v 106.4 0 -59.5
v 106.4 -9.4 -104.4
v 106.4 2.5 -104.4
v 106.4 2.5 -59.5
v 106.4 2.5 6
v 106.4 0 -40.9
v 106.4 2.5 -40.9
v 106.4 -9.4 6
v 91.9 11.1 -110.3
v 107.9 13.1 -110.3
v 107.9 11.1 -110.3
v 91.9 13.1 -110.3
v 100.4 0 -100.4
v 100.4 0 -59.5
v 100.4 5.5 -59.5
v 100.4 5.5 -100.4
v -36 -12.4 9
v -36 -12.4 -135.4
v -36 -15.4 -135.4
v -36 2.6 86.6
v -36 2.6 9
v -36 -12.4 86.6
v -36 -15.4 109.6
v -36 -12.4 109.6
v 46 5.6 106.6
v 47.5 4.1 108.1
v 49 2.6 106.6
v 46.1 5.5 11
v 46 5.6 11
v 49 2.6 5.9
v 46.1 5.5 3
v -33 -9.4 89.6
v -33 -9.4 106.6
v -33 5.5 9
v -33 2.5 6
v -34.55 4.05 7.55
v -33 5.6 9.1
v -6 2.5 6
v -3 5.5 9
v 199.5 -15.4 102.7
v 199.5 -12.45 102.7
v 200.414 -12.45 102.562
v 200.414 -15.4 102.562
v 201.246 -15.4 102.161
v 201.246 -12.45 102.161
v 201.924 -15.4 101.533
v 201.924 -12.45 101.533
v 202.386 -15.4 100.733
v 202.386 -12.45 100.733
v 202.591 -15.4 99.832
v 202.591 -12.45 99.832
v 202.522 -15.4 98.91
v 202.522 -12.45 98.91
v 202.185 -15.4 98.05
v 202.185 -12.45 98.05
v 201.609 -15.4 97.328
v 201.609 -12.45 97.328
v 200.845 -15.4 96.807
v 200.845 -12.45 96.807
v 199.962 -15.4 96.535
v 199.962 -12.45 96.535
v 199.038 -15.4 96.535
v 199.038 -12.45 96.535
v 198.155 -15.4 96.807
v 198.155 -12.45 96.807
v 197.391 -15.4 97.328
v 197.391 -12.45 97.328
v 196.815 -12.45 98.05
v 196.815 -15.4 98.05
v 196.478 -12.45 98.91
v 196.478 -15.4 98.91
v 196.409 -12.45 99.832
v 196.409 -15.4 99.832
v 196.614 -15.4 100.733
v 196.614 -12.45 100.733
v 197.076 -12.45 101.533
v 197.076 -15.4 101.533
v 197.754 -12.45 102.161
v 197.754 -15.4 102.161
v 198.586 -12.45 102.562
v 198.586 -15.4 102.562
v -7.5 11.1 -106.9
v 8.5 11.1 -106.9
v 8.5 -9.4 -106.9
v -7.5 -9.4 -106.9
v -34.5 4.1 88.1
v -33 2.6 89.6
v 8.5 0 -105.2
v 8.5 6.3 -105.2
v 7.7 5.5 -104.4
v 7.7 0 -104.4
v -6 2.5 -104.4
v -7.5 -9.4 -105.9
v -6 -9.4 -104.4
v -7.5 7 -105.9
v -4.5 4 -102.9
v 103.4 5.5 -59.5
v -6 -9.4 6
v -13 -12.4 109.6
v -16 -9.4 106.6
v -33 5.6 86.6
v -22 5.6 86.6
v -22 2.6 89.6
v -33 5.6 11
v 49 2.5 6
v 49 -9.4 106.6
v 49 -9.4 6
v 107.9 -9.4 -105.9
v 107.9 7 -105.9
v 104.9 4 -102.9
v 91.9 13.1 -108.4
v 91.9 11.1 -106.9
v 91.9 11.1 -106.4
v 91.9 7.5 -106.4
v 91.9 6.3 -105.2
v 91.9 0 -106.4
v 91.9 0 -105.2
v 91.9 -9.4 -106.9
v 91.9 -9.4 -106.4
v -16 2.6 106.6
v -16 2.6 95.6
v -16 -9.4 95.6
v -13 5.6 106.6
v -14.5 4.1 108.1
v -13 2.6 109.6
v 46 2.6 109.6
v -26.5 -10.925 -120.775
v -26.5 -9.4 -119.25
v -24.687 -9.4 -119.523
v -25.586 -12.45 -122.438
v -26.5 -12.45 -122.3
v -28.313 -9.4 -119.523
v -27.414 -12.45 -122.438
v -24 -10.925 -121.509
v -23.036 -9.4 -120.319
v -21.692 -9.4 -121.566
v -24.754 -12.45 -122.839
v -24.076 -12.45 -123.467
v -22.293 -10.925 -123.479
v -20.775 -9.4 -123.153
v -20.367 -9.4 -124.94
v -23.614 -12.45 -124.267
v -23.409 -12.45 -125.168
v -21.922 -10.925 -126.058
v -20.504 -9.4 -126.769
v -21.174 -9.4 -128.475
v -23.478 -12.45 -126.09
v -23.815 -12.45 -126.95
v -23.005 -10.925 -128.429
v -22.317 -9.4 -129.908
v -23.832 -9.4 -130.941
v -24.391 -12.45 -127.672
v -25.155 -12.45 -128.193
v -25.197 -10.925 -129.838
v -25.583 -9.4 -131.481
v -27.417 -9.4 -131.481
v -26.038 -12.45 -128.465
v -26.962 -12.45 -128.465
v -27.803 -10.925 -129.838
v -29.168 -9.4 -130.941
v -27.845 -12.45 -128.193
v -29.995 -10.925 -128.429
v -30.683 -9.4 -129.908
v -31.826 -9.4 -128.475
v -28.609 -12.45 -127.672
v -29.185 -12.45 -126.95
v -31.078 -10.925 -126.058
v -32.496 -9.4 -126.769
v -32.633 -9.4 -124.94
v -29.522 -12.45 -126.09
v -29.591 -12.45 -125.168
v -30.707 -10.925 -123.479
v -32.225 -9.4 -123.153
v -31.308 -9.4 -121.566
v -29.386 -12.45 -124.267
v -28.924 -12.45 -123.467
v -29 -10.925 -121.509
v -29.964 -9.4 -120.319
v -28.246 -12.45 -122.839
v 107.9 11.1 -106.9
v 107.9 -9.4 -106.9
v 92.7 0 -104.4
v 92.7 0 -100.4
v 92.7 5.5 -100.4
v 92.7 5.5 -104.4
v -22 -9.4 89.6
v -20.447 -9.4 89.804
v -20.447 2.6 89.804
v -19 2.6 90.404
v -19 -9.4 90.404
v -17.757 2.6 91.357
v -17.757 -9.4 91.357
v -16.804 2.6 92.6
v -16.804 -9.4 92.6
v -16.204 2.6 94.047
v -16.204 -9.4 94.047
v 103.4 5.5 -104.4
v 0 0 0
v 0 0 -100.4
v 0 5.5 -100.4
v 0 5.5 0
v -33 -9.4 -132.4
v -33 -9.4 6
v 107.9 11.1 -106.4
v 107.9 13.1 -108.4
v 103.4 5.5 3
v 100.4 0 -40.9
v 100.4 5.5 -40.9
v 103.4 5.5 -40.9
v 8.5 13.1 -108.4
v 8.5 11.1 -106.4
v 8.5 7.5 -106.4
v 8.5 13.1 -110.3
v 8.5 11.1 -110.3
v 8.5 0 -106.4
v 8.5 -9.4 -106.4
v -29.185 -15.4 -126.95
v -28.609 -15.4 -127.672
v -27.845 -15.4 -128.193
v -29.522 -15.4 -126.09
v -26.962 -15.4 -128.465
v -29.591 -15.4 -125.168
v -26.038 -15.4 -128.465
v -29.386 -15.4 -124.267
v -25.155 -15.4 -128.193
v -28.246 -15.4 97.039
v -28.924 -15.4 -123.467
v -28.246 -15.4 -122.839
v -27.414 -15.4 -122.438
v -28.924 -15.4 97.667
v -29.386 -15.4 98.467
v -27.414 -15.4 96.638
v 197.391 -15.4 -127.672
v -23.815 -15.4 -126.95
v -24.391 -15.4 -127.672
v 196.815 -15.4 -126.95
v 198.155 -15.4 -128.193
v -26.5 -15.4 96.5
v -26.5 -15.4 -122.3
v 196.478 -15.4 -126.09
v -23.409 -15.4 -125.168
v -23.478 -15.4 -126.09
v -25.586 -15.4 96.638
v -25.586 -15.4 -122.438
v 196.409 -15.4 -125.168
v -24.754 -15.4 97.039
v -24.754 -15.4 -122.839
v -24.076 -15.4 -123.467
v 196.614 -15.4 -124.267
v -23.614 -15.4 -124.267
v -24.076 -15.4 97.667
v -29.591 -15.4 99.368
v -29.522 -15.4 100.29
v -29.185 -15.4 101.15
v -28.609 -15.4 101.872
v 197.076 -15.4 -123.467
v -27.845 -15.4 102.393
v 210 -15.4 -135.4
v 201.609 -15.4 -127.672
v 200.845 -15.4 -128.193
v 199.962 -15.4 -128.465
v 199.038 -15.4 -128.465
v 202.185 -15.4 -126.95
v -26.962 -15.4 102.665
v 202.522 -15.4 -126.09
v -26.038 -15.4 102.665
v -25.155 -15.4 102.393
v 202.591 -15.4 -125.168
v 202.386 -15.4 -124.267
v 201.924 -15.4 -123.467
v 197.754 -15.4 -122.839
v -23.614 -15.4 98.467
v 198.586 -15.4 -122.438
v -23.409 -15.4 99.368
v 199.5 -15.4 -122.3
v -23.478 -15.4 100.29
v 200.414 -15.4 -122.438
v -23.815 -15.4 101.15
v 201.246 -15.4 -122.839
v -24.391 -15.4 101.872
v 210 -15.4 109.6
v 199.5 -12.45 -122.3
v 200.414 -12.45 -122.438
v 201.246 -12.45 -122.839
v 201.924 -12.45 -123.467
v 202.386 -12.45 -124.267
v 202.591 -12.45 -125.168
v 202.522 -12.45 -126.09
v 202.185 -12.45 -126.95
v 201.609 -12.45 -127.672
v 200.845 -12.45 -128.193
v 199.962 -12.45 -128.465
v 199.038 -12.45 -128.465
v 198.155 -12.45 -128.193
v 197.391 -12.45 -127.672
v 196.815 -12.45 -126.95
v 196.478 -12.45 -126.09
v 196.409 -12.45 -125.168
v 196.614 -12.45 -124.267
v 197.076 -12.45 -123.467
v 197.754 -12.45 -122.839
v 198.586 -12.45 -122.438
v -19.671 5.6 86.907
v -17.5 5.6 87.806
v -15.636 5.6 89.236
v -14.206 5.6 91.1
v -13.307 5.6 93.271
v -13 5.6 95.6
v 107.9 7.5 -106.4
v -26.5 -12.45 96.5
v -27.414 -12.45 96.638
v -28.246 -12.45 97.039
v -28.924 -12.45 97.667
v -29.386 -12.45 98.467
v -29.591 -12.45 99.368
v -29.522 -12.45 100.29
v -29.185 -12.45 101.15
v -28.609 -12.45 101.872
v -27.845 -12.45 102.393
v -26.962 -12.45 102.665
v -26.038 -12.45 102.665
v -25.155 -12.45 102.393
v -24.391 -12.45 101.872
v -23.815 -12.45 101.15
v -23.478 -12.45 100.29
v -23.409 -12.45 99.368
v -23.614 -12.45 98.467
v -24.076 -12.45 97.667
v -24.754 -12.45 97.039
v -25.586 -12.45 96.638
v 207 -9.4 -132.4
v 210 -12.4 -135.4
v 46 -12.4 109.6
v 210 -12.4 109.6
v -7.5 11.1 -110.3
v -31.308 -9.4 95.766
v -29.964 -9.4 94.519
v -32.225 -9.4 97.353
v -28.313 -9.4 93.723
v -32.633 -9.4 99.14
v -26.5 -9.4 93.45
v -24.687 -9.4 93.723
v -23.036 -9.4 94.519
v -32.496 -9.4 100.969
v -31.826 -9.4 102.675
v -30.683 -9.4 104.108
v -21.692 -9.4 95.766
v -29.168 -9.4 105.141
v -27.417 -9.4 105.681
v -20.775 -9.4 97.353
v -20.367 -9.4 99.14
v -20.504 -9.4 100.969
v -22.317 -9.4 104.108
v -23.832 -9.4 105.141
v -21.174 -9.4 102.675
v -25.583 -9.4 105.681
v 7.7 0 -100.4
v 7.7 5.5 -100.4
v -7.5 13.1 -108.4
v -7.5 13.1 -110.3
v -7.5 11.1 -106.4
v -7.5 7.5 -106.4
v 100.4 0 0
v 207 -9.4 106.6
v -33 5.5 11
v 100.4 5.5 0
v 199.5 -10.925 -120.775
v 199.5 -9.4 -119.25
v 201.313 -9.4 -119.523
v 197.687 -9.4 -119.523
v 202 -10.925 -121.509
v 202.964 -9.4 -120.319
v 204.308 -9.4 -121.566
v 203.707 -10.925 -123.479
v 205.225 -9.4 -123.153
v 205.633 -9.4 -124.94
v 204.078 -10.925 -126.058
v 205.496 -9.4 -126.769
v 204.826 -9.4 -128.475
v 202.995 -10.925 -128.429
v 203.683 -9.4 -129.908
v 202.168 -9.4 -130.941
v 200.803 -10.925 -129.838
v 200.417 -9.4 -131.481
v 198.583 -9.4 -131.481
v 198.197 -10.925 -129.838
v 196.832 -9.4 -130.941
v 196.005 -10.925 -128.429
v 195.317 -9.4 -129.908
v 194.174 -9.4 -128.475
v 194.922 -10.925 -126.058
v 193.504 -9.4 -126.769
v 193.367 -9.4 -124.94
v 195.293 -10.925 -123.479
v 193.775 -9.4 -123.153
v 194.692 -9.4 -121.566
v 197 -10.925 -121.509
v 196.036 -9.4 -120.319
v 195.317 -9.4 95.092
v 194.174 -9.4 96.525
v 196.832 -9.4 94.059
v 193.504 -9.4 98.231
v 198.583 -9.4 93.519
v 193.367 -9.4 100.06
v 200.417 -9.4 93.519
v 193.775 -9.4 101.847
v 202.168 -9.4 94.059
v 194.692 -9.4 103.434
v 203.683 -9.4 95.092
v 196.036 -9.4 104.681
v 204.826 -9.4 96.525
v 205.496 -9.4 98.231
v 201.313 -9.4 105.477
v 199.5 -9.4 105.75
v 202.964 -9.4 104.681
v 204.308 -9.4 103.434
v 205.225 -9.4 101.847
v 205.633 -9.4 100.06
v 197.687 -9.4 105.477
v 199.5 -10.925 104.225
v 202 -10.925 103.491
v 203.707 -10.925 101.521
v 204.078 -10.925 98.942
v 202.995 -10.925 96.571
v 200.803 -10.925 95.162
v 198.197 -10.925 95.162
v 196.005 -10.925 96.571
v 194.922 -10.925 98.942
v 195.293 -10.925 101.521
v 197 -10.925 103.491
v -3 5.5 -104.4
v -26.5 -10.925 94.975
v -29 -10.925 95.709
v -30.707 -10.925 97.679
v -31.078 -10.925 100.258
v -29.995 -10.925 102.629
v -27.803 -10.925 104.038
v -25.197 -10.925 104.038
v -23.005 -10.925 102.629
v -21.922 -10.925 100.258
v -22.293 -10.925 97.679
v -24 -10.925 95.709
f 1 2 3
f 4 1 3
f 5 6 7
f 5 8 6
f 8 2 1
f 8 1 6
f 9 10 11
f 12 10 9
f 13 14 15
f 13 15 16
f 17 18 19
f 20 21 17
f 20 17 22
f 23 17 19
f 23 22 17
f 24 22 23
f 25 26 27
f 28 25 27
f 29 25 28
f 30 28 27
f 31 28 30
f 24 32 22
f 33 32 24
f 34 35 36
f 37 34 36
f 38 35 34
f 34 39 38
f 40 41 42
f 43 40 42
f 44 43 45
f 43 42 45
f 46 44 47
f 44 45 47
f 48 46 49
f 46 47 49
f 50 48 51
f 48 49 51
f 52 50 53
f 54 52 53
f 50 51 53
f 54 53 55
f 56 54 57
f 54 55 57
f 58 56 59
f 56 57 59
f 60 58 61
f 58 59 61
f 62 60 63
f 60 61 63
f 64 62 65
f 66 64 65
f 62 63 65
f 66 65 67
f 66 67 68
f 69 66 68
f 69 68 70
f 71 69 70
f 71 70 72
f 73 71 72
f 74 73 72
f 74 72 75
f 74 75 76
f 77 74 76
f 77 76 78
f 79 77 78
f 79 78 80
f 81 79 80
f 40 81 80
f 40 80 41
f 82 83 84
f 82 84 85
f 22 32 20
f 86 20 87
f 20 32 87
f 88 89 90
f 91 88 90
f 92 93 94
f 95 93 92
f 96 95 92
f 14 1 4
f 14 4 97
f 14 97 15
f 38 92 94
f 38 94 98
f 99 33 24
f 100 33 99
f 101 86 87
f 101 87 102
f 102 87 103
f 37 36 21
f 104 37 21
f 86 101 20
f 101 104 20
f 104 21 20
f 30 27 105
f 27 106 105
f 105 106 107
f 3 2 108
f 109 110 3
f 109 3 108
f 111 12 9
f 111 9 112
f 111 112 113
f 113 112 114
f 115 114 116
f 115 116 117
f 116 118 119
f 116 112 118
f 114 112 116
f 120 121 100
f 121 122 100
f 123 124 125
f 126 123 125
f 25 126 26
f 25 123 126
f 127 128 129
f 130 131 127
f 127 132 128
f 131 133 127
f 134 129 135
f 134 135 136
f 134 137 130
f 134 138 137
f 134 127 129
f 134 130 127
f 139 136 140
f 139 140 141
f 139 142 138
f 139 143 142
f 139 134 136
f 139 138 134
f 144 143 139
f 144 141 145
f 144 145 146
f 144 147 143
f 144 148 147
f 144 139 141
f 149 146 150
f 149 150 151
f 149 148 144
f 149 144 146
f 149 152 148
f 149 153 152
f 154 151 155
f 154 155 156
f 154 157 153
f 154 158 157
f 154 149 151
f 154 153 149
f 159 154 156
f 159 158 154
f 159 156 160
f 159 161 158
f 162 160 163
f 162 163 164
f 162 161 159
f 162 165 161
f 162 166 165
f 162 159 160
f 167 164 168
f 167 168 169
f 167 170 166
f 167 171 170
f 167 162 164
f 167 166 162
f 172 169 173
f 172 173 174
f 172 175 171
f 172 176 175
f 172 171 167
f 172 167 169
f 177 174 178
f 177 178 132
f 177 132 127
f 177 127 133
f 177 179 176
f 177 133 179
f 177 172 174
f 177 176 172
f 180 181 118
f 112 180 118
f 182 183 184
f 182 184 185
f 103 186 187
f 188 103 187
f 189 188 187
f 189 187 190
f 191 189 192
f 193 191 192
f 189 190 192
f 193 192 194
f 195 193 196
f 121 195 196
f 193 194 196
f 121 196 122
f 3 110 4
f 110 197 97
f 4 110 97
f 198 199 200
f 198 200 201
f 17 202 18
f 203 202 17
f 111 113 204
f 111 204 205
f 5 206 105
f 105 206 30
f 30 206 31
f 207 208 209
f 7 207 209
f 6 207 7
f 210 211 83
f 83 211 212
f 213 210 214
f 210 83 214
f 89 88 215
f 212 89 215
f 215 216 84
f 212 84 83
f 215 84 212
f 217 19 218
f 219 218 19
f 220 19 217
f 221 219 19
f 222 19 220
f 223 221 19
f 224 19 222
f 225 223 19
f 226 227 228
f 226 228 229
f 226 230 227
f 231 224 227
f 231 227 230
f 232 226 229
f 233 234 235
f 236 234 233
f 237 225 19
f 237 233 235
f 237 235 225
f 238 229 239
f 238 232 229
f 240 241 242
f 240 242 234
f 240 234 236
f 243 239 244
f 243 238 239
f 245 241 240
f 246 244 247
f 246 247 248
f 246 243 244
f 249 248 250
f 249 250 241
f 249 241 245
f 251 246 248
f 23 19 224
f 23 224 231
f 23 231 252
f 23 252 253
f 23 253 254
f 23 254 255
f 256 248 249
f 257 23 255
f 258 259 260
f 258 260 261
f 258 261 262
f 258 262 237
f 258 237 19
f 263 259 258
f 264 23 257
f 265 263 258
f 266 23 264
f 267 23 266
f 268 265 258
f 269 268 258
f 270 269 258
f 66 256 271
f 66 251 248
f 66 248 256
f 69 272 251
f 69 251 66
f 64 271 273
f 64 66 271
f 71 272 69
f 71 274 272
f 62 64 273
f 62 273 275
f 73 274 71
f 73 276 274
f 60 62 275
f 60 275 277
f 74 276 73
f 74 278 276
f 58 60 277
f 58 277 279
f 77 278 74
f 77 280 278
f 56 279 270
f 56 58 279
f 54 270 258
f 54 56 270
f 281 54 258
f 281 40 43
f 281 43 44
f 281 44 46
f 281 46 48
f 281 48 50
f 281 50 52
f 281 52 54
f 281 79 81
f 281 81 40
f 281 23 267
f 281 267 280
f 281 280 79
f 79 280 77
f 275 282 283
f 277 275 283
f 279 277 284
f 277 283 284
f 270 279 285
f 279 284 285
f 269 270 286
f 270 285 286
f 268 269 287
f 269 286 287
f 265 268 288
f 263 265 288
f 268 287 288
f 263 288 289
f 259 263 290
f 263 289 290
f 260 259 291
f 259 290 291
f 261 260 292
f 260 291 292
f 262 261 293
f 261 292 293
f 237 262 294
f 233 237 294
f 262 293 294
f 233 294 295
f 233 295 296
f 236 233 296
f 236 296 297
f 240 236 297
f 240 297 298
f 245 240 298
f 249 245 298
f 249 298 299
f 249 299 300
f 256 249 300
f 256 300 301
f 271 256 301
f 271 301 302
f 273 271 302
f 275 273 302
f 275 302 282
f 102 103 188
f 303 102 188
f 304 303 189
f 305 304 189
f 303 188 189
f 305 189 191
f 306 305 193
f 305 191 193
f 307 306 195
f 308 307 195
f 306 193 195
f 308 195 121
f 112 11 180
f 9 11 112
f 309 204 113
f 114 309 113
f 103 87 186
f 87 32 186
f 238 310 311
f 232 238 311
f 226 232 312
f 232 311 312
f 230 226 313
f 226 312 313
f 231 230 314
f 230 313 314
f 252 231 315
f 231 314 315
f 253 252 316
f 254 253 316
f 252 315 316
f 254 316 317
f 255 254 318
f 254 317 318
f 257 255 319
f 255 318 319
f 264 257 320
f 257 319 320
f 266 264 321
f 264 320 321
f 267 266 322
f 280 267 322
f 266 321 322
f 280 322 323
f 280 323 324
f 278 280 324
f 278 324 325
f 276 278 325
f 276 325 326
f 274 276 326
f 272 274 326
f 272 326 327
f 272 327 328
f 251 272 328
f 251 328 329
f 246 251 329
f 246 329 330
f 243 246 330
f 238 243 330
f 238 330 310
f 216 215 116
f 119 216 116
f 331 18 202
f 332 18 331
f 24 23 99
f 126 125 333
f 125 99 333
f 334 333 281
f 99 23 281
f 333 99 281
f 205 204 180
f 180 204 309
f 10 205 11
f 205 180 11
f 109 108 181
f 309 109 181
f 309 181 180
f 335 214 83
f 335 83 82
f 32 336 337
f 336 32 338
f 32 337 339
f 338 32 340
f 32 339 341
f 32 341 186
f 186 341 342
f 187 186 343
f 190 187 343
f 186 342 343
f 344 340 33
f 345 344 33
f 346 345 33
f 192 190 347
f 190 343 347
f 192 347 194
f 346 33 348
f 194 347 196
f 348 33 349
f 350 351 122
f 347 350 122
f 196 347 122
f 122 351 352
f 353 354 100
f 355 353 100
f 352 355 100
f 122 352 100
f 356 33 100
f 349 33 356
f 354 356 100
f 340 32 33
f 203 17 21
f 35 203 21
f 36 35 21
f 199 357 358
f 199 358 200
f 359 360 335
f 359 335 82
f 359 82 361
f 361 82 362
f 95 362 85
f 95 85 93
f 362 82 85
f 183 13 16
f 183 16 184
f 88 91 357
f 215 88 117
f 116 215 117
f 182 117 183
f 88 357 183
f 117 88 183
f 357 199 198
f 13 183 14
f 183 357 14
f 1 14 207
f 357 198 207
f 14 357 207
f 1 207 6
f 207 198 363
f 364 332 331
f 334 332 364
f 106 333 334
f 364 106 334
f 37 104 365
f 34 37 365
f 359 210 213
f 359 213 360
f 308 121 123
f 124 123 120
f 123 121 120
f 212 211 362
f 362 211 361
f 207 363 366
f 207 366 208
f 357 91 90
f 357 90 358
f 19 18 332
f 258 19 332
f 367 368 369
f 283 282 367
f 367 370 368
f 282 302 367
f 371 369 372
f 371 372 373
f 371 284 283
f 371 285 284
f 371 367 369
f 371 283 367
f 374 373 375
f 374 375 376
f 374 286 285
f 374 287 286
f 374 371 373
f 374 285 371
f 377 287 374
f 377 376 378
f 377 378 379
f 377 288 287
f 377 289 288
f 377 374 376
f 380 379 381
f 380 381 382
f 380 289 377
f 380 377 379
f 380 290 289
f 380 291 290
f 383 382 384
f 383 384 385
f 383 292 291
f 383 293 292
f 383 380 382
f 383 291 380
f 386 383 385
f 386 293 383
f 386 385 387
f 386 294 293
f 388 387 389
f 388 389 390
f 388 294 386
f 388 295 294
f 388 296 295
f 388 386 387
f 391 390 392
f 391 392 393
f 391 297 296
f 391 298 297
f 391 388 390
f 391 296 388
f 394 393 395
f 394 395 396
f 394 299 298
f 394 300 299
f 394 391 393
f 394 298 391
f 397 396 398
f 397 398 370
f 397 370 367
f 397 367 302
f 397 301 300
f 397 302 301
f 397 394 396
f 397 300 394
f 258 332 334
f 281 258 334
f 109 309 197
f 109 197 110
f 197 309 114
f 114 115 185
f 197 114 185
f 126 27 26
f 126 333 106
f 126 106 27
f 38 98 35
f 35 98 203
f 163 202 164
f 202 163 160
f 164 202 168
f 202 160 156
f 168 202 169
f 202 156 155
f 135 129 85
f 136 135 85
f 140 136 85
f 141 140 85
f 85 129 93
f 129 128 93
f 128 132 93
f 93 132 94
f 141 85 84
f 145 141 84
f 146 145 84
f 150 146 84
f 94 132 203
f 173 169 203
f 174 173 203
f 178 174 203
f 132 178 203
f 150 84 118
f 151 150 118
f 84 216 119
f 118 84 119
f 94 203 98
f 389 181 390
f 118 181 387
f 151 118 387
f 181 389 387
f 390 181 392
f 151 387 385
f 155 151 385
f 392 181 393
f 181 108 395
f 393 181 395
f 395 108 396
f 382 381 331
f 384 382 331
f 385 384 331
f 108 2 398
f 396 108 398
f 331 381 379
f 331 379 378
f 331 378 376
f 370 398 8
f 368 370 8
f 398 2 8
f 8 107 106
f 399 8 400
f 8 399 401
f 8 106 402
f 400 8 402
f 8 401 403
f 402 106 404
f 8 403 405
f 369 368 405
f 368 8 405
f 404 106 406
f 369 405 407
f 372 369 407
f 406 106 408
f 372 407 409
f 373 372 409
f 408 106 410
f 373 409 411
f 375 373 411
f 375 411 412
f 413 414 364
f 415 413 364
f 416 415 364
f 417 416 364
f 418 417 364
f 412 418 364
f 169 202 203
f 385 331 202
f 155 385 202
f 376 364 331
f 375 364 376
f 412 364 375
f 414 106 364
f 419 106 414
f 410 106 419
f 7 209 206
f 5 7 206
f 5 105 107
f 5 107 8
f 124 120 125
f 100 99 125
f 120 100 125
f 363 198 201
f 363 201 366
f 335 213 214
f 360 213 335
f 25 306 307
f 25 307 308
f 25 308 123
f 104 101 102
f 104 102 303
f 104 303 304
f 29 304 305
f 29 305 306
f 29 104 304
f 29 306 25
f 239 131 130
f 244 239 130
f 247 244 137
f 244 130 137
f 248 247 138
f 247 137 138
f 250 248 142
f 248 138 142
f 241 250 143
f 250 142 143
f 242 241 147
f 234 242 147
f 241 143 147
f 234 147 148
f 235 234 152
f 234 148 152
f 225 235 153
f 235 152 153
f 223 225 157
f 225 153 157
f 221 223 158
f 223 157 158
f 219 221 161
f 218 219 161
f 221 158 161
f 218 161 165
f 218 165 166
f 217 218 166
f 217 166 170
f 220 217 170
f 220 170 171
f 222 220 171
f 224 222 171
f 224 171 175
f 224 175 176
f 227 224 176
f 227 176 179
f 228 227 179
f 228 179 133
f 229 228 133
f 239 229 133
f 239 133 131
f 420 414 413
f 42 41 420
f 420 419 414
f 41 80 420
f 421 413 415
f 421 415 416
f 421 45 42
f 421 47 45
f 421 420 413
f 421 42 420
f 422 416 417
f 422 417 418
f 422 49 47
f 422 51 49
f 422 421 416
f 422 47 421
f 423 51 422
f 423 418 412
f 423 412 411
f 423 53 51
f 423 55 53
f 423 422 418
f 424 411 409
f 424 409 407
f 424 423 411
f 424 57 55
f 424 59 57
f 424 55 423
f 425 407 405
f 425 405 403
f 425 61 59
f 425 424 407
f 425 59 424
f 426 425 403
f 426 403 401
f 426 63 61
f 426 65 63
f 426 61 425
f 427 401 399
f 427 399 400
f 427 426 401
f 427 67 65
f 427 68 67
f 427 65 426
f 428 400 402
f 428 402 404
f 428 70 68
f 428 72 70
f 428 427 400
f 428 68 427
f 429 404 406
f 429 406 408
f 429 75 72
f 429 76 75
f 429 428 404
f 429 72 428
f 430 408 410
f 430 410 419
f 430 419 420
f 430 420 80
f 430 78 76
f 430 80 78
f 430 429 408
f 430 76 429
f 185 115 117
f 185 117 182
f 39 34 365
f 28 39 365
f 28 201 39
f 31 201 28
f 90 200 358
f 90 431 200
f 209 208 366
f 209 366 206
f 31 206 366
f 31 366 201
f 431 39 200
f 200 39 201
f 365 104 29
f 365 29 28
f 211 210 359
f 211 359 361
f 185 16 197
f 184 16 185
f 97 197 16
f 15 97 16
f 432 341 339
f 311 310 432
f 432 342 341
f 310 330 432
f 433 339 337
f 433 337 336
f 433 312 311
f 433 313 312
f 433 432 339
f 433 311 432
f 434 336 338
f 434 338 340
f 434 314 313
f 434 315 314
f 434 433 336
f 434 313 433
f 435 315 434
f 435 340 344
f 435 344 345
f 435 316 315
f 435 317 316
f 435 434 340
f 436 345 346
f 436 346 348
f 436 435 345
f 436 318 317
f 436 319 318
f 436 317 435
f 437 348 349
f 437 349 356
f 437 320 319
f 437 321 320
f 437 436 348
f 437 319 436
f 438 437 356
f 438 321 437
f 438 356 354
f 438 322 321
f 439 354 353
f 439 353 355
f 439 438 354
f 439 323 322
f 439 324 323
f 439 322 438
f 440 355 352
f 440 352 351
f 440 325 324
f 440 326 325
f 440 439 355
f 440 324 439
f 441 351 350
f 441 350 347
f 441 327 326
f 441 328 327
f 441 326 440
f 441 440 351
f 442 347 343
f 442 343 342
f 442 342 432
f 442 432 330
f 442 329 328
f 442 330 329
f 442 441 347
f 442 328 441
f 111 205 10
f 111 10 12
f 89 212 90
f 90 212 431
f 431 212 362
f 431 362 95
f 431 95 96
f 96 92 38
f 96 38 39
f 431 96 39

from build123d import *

# Parameters (mm, degrees)
BOSS_EXTRUDE1_DEPTH   = 5.5
BOSS_EXTRUDE1_2_DEPTH = 5.5
SKETCH2_W             = 112.4
SKETCH2_H             = 112.4
BOSS_EXTRUDE2_DEPTH   = 9.4
BOSS_EXTRUDE3_START   = 9.4
SKETCH2_3_W           = 246
SKETCH2_3_H           = 245
BOSS_EXTRUDE3_DEPTH   = 6
SKETCH3_R             = 3.1
CUT_EXTRUDE1_DEPTH    = 251.310147617
BOSS_EXTRUDE4_DEPTH   = 15
SKETCH5_W             = 16
SKETCH5_H             = 22.5
BOSS_EXTRUDE5_DEPTH   = 3.9
SKETCH6_W             = 16
SKETCH6_H             = 20.5
CUT_EXTRUDE2_DEPTH    = 3.4
CHAMFER1_SIZE         = 2
CHAMFER2_SIZE         = 3.05
CHAMFER3_SIZE         = 3
CHAMFER4_SIZE         = 3
SKETCH8_W             = 79.1
SKETCH8_H             = 5
CUT_EXTRUDE3_DEPTH    = 0.1


with BuildPart() as part:
    # Sketch1 → Boss-Extrude1 (new body)
    with BuildSketch(Plane(origin=(0, 0, 0), x_dir=(1, 0, 0), z_dir=(0, 1, 0))):
        Polygon((-6, -6), (-6, 106.4), (7.7, 106.4), (7.7, 100.4), (0, 100.4), (0, 0), (100.4, 0), (100.4, 40.9), (106.4, 40.9), (106.4, -6), align=None)
    extrude(amount=BOSS_EXTRUDE1_DEPTH)



with BuildPart() as body_2:
    # Sketch1 → Boss-Extrude1 2 (new body)
    with BuildSketch(Plane(origin=(0, 0, 0), x_dir=(1, 0, 0), z_dir=(0, 1, 0))):
        Polygon((92.7, 100.4), (92.7, 106.4), (106.4, 106.4), (106.4, 59.5), (100.4, 59.5), (100.4, 100.4), align=None)
    extrude(amount=BOSS_EXTRUDE1_2_DEPTH)


with BuildPart() as part_1:
    add(part.part)

    add(body_2.part)  # Boss-Extrude2 merges body 2
    # Sketch2 → Boss-Extrude2 (add)
    with BuildSketch(Plane.XZ):
        with Locations((50.2, -50.2)):
            Rectangle(SKETCH2_W, SKETCH2_H)
    extrude(amount=BOSS_EXTRUDE2_DEPTH)

    # Sketch2<3> → Boss-Extrude3 (add)
    with BuildSketch(Plane.XZ.offset(BOSS_EXTRUDE3_START)):
        with Locations((87, -12.9)):
            Rectangle(SKETCH2_3_W, SKETCH2_3_H)
    extrude(amount=BOSS_EXTRUDE3_DEPTH)

    # Sketch3 → Cut-Extrude1 (cut, through all)
    with BuildSketch(Plane(origin=(0, -9.4, 0), x_dir=(1, 0, 0), z_dir=(0, 1, 0))):
        with Locations(Location((-26.5, 125.4, 0), (0, 0, 270))):
            Circle(SKETCH3_R)
        with Locations(Location((-26.5, -99.6, 0), (0, 0, 90))):
            Circle(SKETCH3_R)
        with Locations(Location((199.5, 125.4, 0), (0, 0, 270))):
            Circle(SKETCH3_R)
        with Locations(Location((199.5, -99.6, 0), (0, 0, 270))):
            Circle(SKETCH3_R)
    extrude(amount=-CUT_EXTRUDE1_DEPTH, mode=Mode.SUBTRACT)

    # Sketch4 → Boss-Extrude4 (add)
    with BuildSketch(Plane(origin=(0, -9.4, 0), x_dir=(1, 0, 0), z_dir=(0, 1, 0))):
        with BuildLine():
            Line((-16, -109.6), (49, -109.6))
            Line((49, -109.6), (49, -6))
            Line((49, -6), (-36, -6))
            Line((-36, -6), (-36, -89.6))
            Line((-36, -89.6), (-22, -89.6))
            ThreePointArc((-22, -89.6), (-17.757359313, -91.357359313), (-16, -95.6))
            Line((-16, -95.6), (-16, -109.6))
        make_face()
    extrude(amount=BOSS_EXTRUDE4_DEPTH)

    # Sketch5 → Boss-Extrude5 (add)
    with BuildSketch(Plane(origin=(0, 0, -106.4), x_dir=(-1, 0, 0), z_dir=(0, 0, -1))):
        with Locations((-99.9, 1.85)):
            Rectangle(SKETCH5_W, SKETCH5_H)
        with Locations((-0.5, 1.85)):
            Rectangle(SKETCH5_W, SKETCH5_H)
    extrude(amount=BOSS_EXTRUDE5_DEPTH)

    # Sketch6 → Cut-Extrude2 (cut)
    with BuildSketch(Plane(origin=(0, 0, -110.3), x_dir=(-1, 0, 0), z_dir=(0, 0, -1))):
        with Locations((-0.5, 0.85)):
            Rectangle(SKETCH6_W, SKETCH6_H)
        with Locations((-99.9, 0.85)):
            Rectangle(SKETCH6_W, SKETCH6_H)
    extrude(amount=-CUT_EXTRUDE2_DEPTH, mode=Mode.SUBTRACT)

    # Chamfer1
    # the kernel refuses this chamfer: 2 mm, written as the material it adds along each edge
    with BuildSketch(Plane(origin=(92.7, -5.143365976, -106.4), x_dir=(-0.9996219169112968, 0, -0.027495876610589005), z_dir=(0, 1, 0))) as chamfer1_piece_1_section:
        Polygon((CHAMFER1_SIZE * 0.999621916911, CHAMFER1_SIZE * 0.0274958766106), (-CHAMFER1_SIZE * 0.0274958766106, CHAMFER1_SIZE * 0.999621916911), (0, 0), align=None)
    chamfer1_piece_1 = extrude(amount=10.643365976, mode=Mode.PRIVATE)
    chamfer1_piece_1 = split(chamfer1_piece_1, bisect_by=Plane(origin=(91.9, -2.571682988, -105.57221902), z_dir=(1, 0, 0)), keep=Keep.TOP, mode=Mode.PRIVATE)
    add(chamfer1_piece_1)
    with BuildSketch(Plane(origin=(92.7, 5.5, -106.4), x_dir=(0, 0.9996219169112968, -0.027495876610589075), z_dir=(1, 0, 0)), Plane(origin=(-6, 5.5, -106.4), x_dir=(0, 0.9996219169112968, -0.027495876610589075), z_dir=(1, 0, 0))) as chamfer1_piece_2:
        Polygon((CHAMFER1_SIZE * 0.999621916911, CHAMFER1_SIZE * 0.0274958766106), (-CHAMFER1_SIZE * 0.0274958766106, CHAMFER1_SIZE * 0.999621916911), (0, 0), align=None)
    extrude(amount=13.7)
    with BuildSketch(Plane(origin=(106.4, 5.5, -106.4), x_dir=(-0.027495876610589005, 0, 0.9996219169112968), z_dir=(0, -1, 0))) as chamfer1_piece_3_section:
        Polygon((CHAMFER1_SIZE * 0.999621916911, -CHAMFER1_SIZE * 0.0274958766106), (-CHAMFER1_SIZE * 0.0274958766106, -CHAMFER1_SIZE * 0.999621916911), (0, 0), align=None)
    chamfer1_piece_3 = extrude(amount=14.9, mode=Mode.PRIVATE)
    chamfer1_piece_3 = split(chamfer1_piece_3, bisect_by=Plane(origin=(107.9, -1.95, -105.69608178), z_dir=(-1, 0, 0)), keep=Keep.TOP, mode=Mode.PRIVATE)
    add(chamfer1_piece_3)
    with BuildSketch(Plane(origin=(106.4, 5.5, -106.4), x_dir=(-0.027495876610589005, 0, 0.9996219169112968), z_dir=(0, -1, 0))) as chamfer1_piece_4_section:
        Polygon((CHAMFER1_SIZE * 0.999621916911, -CHAMFER1_SIZE * 0.0274958766106), (-CHAMFER1_SIZE * 0.0274958766106, -CHAMFER1_SIZE * 0.999621916911), (0, 0), align=None)
    chamfer1_piece_4 = extrude(amount=20.043365976, mode=Mode.PRIVATE)
    chamfer1_piece_4 = split(chamfer1_piece_4, bisect_by=Plane(origin=(106.974972825, -9.4, -105.69608178), z_dir=(0, -1, 0)), keep=Keep.TOP, mode=Mode.PRIVATE)
    chamfer1_piece_4 = split(chamfer1_piece_4, bisect_by=Plane(origin=(107.9, -11.971682988, -105.69608178), z_dir=(-1, 0, 0)), keep=Keep.TOP, mode=Mode.PRIVATE)
    add(chamfer1_piece_4)
    with BuildSketch(Plane(origin=(106.4, 5.5, -106.4), x_dir=(-0.027495876610589005, 0, 0.9996219169112968), z_dir=(0, -1, 0))) as chamfer1_piece_5_section:
        Polygon((CHAMFER1_SIZE * 0.999621916911, -CHAMFER1_SIZE * 0.0274958766106), (-CHAMFER1_SIZE * 0.0274958766106, -CHAMFER1_SIZE * 0.999621916911), (0, 0), align=None)
    chamfer1_piece_5 = extrude(amount=20.043365976, mode=Mode.PRIVATE)
    chamfer1_piece_5 = split(chamfer1_piece_5, bisect_by=Plane(origin=(108.09753906, -9.4, -106.284213701), z_dir=(0, -1, 0)), keep=Keep.TOP, mode=Mode.PRIVATE)
    chamfer1_piece_5 = split(chamfer1_piece_5, bisect_by=Plane(origin=(107.9, -11.971682988, -106.284213701), z_dir=(1, 0, 0)), keep=Keep.TOP, mode=Mode.PRIVATE)
    add(chamfer1_piece_5)
    with BuildSketch(Plane(origin=(7.7, -5.143365976, -106.4), x_dir=(0.9996219169112965, 0, -0.027495876610589057), z_dir=(0, 1, 0))) as chamfer1_piece_6_section:
        Polygon((CHAMFER1_SIZE * 0.999621916911, -CHAMFER1_SIZE * 0.0274958766106), (-CHAMFER1_SIZE * 0.0274958766106, -CHAMFER1_SIZE * 0.999621916911), (0, 0), align=None)
    chamfer1_piece_6 = extrude(amount=10.643365976, mode=Mode.PRIVATE)
    chamfer1_piece_6 = split(chamfer1_piece_6, bisect_by=Plane(origin=(8.5, -2.571682988, -105.57221902), z_dir=(-1, 0, 0)), keep=Keep.TOP, mode=Mode.PRIVATE)
    add(chamfer1_piece_6)
    with BuildSketch(Plane(origin=(-6, 5.5, -106.4), x_dir=(-0.9996219169112968, 0, -0.027495876610589075), z_dir=(0, -1, 0))) as chamfer1_piece_7_section:
        Polygon((CHAMFER1_SIZE * 0.999621916911, -CHAMFER1_SIZE * 0.0274958766106), (-CHAMFER1_SIZE * 0.0274958766106, -CHAMFER1_SIZE * 0.999621916911), (0, 0), align=None)
    chamfer1_piece_7 = extrude(amount=14.9, mode=Mode.PRIVATE)
    chamfer1_piece_7 = split(chamfer1_piece_7, bisect_by=Plane(origin=(-7.5, -1.95, -105.69608178), z_dir=(1, 0, 0)), keep=Keep.TOP, mode=Mode.PRIVATE)
    add(chamfer1_piece_7)
    with BuildSketch(Plane(origin=(-6, 5.5, -106.4), x_dir=(-0.9996219169112968, 0, -0.027495876610589075), z_dir=(0, -1, 0))) as chamfer1_piece_8_section:
        Polygon((CHAMFER1_SIZE * 0.999621916911, -CHAMFER1_SIZE * 0.0274958766106), (-CHAMFER1_SIZE * 0.0274958766106, -CHAMFER1_SIZE * 0.999621916911), (0, 0), align=None)
    chamfer1_piece_8 = extrude(amount=20.043365976, mode=Mode.PRIVATE)
    chamfer1_piece_8 = split(chamfer1_piece_8, bisect_by=Plane(origin=(-7.69753906, -9.4, -106.284213701), z_dir=(0, -1, 0)), keep=Keep.TOP, mode=Mode.PRIVATE)
    chamfer1_piece_8 = split(chamfer1_piece_8, bisect_by=Plane(origin=(-7.5, -11.971682988, -106.284213701), z_dir=(-1, 0, 0)), keep=Keep.TOP, mode=Mode.PRIVATE)
    add(chamfer1_piece_8)
    with BuildSketch(Plane(origin=(-6, 5.5, -106.4), x_dir=(-0.9996219169112968, 0, -0.027495876610589075), z_dir=(0, -1, 0))) as chamfer1_piece_9_section:
        Polygon((CHAMFER1_SIZE * 0.999621916911, -CHAMFER1_SIZE * 0.0274958766106), (-CHAMFER1_SIZE * 0.0274958766106, -CHAMFER1_SIZE * 0.999621916911), (0, 0), align=None)
    chamfer1_piece_9 = extrude(amount=20.043365976, mode=Mode.PRIVATE)
    chamfer1_piece_9 = split(chamfer1_piece_9, bisect_by=Plane(origin=(-6.574972825, -9.4, -105.69608178), z_dir=(0, -1, 0)), keep=Keep.TOP, mode=Mode.PRIVATE)
    chamfer1_piece_9 = split(chamfer1_piece_9, bisect_by=Plane(origin=(-7.5, -11.971682988, -105.69608178), z_dir=(1, 0, 0)), keep=Keep.TOP, mode=Mode.PRIVATE)
    add(chamfer1_piece_9)
    with BuildSketch(Plane(origin=(87.556634024, 5.5, -106.4), x_dir=(0, 0.9996219169112968, -0.027495876610589075), z_dir=(1, 0, 0))) as chamfer1_piece_10a_section:
        Polygon((CHAMFER1_SIZE * 0.999621916911, CHAMFER1_SIZE * 0.0274958766106), (-CHAMFER1_SIZE * 0.0274958766106, CHAMFER1_SIZE * 0.999621916911), (0, 0), align=None)
    chamfer1_piece_10a = extrude(amount=18.843365976, mode=Mode.PRIVATE)
    chamfer1_piece_10a = split(chamfer1_piece_10a, bisect_by=Plane(origin=(91.9, 6.159587254, -105.740412746), z_dir=(1, 0, 0)), keep=Keep.TOP, mode=Mode.PRIVATE)
    chamfer1_piece_10a = split(chamfer1_piece_10a, bisect_by=Plane(origin=(92.7, 6.159587254, -105.740412746), z_dir=(-1, 0, 0)), keep=Keep.TOP, mode=Mode.PRIVATE)
    with BuildSketch(Plane(origin=(92.7, 0, -106.4), x_dir=(-0.9996219169112968, 0, -0.027495876610589005), z_dir=(0, 1, 0))) as chamfer1_piece_10b_section:
        Polygon((CHAMFER1_SIZE * 0.999621916911, CHAMFER1_SIZE * 0.0274958766106), (-CHAMFER1_SIZE * 0.0274958766106, CHAMFER1_SIZE * 0.999621916911), (0, 0), align=None)
    chamfer1_piece_10b = extrude(amount=10.643365976, mode=Mode.PRIVATE)
    chamfer1_piece_10b = split(chamfer1_piece_10b, bisect_by=Plane(origin=(91.9, 8.071682988, -105.57221902), z_dir=(1, 0, 0)), keep=Keep.TOP, mode=Mode.PRIVATE)
    chamfer1_piece_10b = split(chamfer1_piece_10b, bisect_by=Plane(origin=(92.36112716, 5.5, -105.57221902), z_dir=(0, 1, 0)), keep=Keep.TOP, mode=Mode.PRIVATE)
    chamfer1_piece_10 = chamfer1_piece_10a & chamfer1_piece_10b
    add(chamfer1_piece_10)
    with BuildSketch(Plane(origin=(106.4, 10.643365976, -106.4), x_dir=(-0.027495876610589005, 0, 0.9996219169112968), z_dir=(0, -1, 0))) as chamfer1_piece_11a_section:
        Polygon((CHAMFER1_SIZE * 0.999621916911, -CHAMFER1_SIZE * 0.0274958766106), (-CHAMFER1_SIZE * 0.0274958766106, -CHAMFER1_SIZE * 0.999621916911), (0, 0), align=None)
    chamfer1_piece_11a = extrude(amount=20.043365976, mode=Mode.PRIVATE)
    chamfer1_piece_11a = split(chamfer1_piece_11a, bisect_by=Plane(origin=(106.974972825, 5.5, -105.69608178), z_dir=(0, 1, 0)), keep=Keep.TOP, mode=Mode.PRIVATE)
    chamfer1_piece_11a = split(chamfer1_piece_11a, bisect_by=Plane(origin=(107.9, 8.071682988, -105.69608178), z_dir=(-1, 0, 0)), keep=Keep.TOP, mode=Mode.PRIVATE)
    with BuildSketch(Plane(origin=(92.7, 5.5, -106.4), x_dir=(0, 0.9996219169112968, -0.027495876610589075), z_dir=(1, 0, 0))) as chamfer1_piece_11b_section:
        Polygon((CHAMFER1_SIZE * 0.999621916911, CHAMFER1_SIZE * 0.0274958766106), (-CHAMFER1_SIZE * 0.0274958766106, CHAMFER1_SIZE * 0.999621916911), (0, 0), align=None)
    chamfer1_piece_11b = extrude(amount=18.843365976, mode=Mode.PRIVATE)
    chamfer1_piece_11b = split(chamfer1_piece_11b, bisect_by=Plane(origin=(106.4, 6.159587254, -105.740412746), z_dir=(1, 0, 0)), keep=Keep.TOP, mode=Mode.PRIVATE)
    chamfer1_piece_11b = split(chamfer1_piece_11b, bisect_by=Plane(origin=(107.9, 6.159587254, -105.740412746), z_dir=(-1, 0, 0)), keep=Keep.TOP, mode=Mode.PRIVATE)
    chamfer1_piece_11 = chamfer1_piece_11a & chamfer1_piece_11b
    add(chamfer1_piece_11)
    with BuildSketch(Plane(origin=(-6, 5.5, -106.4), x_dir=(0, 0.9996219169112968, -0.027495876610589075), z_dir=(1, 0, 0))) as chamfer1_piece_12a_section:
        Polygon((CHAMFER1_SIZE * 0.999621916911, CHAMFER1_SIZE * 0.0274958766106), (-CHAMFER1_SIZE * 0.0274958766106, CHAMFER1_SIZE * 0.999621916911), (0, 0), align=None)
    chamfer1_piece_12a = extrude(amount=18.843365976, mode=Mode.PRIVATE)
    chamfer1_piece_12a = split(chamfer1_piece_12a, bisect_by=Plane(origin=(8.5, 6.159587254, -105.740412746), z_dir=(-1, 0, 0)), keep=Keep.TOP, mode=Mode.PRIVATE)
    chamfer1_piece_12a = split(chamfer1_piece_12a, bisect_by=Plane(origin=(7.7, 6.159587254, -105.740412746), z_dir=(1, 0, 0)), keep=Keep.TOP, mode=Mode.PRIVATE)
    with BuildSketch(Plane(origin=(7.7, 0, -106.4), x_dir=(0.9996219169112965, 0, -0.027495876610589057), z_dir=(0, 1, 0))) as chamfer1_piece_12b_section:
        Polygon((CHAMFER1_SIZE * 0.999621916911, -CHAMFER1_SIZE * 0.0274958766106), (-CHAMFER1_SIZE * 0.0274958766106, -CHAMFER1_SIZE * 0.999621916911), (0, 0), align=None)
    chamfer1_piece_12b = extrude(amount=10.643365976, mode=Mode.PRIVATE)
    chamfer1_piece_12b = split(chamfer1_piece_12b, bisect_by=Plane(origin=(8.5, 8.071682988, -105.57221902), z_dir=(-1, 0, 0)), keep=Keep.TOP, mode=Mode.PRIVATE)
    chamfer1_piece_12b = split(chamfer1_piece_12b, bisect_by=Plane(origin=(8.03887284, 5.5, -105.57221902), z_dir=(0, 1, 0)), keep=Keep.TOP, mode=Mode.PRIVATE)
    chamfer1_piece_12 = chamfer1_piece_12a & chamfer1_piece_12b
    add(chamfer1_piece_12)
    with BuildSketch(Plane(origin=(-6, 10.643365976, -106.4), x_dir=(-0.9996219169112968, 0, -0.027495876610589075), z_dir=(0, -1, 0))) as chamfer1_piece_13a_section:
        Polygon((CHAMFER1_SIZE * 0.999621916911, -CHAMFER1_SIZE * 0.0274958766106), (-CHAMFER1_SIZE * 0.0274958766106, -CHAMFER1_SIZE * 0.999621916911), (0, 0), align=None)
    chamfer1_piece_13a = extrude(amount=20.043365976, mode=Mode.PRIVATE)
    chamfer1_piece_13a = split(chamfer1_piece_13a, bisect_by=Plane(origin=(-7.5, 8.071682988, -105.69608178), z_dir=(1, 0, 0)), keep=Keep.TOP, mode=Mode.PRIVATE)
    chamfer1_piece_13a = split(chamfer1_piece_13a, bisect_by=Plane(origin=(-6.574972825, 5.5, -105.69608178), z_dir=(0, 1, 0)), keep=Keep.TOP, mode=Mode.PRIVATE)
    with BuildSketch(Plane(origin=(-11.143365976, 5.5, -106.4), x_dir=(0, 0.9996219169112968, -0.027495876610589075), z_dir=(1, 0, 0))) as chamfer1_piece_13b_section:
        Polygon((CHAMFER1_SIZE * 0.999621916911, CHAMFER1_SIZE * 0.0274958766106), (-CHAMFER1_SIZE * 0.0274958766106, CHAMFER1_SIZE * 0.999621916911), (0, 0), align=None)
    chamfer1_piece_13b = extrude(amount=18.843365976, mode=Mode.PRIVATE)
    chamfer1_piece_13b = split(chamfer1_piece_13b, bisect_by=Plane(origin=(-7.5, 6.159587254, -105.740412746), z_dir=(1, 0, 0)), keep=Keep.TOP, mode=Mode.PRIVATE)
    chamfer1_piece_13b = split(chamfer1_piece_13b, bisect_by=Plane(origin=(-6, 6.159587254, -105.740412746), z_dir=(-1, 0, 0)), keep=Keep.TOP, mode=Mode.PRIVATE)
    chamfer1_piece_13 = chamfer1_piece_13a & chamfer1_piece_13b
    add(chamfer1_piece_13)
    # the kernel refuses this chamfer: 2 mm, written as the material it takes off along each edge
    with BuildSketch(Plane(origin=(113.043365976, 13.1, -106.4), x_dir=(1.4427442484973125e-15, -0.9996219169112968, 0.027495876610589075), z_dir=(-1, 0, 0)), Plane(origin=(-12.643365976, 13.1, -106.4), x_dir=(0, 0.027495876610586414, -0.9996219169112968), z_dir=(1, 0, 0))) as chamfer1_2_piece_1:
        Polygon((CHAMFER1_SIZE * 0.999621916911, -CHAMFER1_SIZE * 0.0274958766106), (-CHAMFER1_SIZE * 0.0274958766106, -CHAMFER1_SIZE * 0.999621916911), (0, 0), align=None)
    extrude(amount=26.286731952, mode=Mode.SUBTRACT)

    # Chamfer2
    chamfer2_edges = [part_1.edges().sort_by_distance(p)[0] for p in [
        (199.5, -9.4, -128.5),
        (-26.5, -9.4, -128.5),
        (-26.5, -9.4, 102.7),
        (199.5, -9.4, 96.5),
    ]]
    chamfer(chamfer2_edges, length=CHAMFER2_SIZE)

    # Chamfer3
    chamfer3_edges = [part_1.edges().sort_by_distance(p)[0] for p in [
        (106.4, 5.5, -17.45),
    ]]
    chamfer(chamfer3_edges, length=CHAMFER3_SIZE)
    chamfer3_2_edges = [part_1.edges().sort_by_distance(p)[0] for p in [
        (106.4, 5.5, -81.95),
    ]]
    chamfer(chamfer3_2_edges, length=CHAMFER3_SIZE)
    chamfer3_3_edges = [part_1.edges().sort_by_distance(p)[0] for p in [
        (76.2, 5.5, 6),
    ]]
    chamfer(chamfer3_3_edges, length=CHAMFER3_SIZE)
    chamfer3_4_edges = [part_1.edges().sort_by_distance(p)[0] for p in [
        (49, 5.6, 57.8),
    ]]
    chamfer(chamfer3_4_edges, length=CHAMFER3_SIZE)
    chamfer3_5_edges = [part_1.edges().sort_by_distance(p)[0] for p in [
        (15, 5.6, 109.6),
    ]]
    chamfer(chamfer3_5_edges, length=CHAMFER3_SIZE)
    chamfer3_6_edges = [part_1.edges().sort_by_distance(p)[0] for p in [
        (-36, 5.6, 47.8),
    ]]
    chamfer(chamfer3_6_edges, length=CHAMFER3_SIZE)
    chamfer3_7_edges = [part_1.edges().sort_by_distance(p)[0] for p in [
        (-6, 5.5, -49.2),
    ]]
    chamfer(chamfer3_7_edges, length=CHAMFER3_SIZE)
    chamfer3_8_edges = [part_1.edges().sort_by_distance(p)[0] for p in [
        (-16, 5.6, 101.1),
        (-27.5, 5.6, 89.6),
        (-17.757359313, 5.6, 91.357359313),
    ]]
    chamfer(chamfer3_8_edges, length=CHAMFER3_SIZE)

    # Chamfer4
    chamfer4_edges = [part_1.edges().sort_by_distance(p)[0] for p in [
        (-36, -9.4, -64.7),
        (129.5, -9.4, 109.6),
        (-36, -3.4, 89.6),
        (-36, -3.4, 6),
        (-16, -3.4, 109.6),
        (49, -3.4, 109.6),
        (-36, -9.4, 99.6),
        (87, -9.4, -135.4),
        (-26, -9.4, 109.6),
        (210, -9.4, -12.9),
    ]]
    chamfer(chamfer4_edges, length=CHAMFER4_SIZE)

    # Sketch8 → Cut-Extrude3 (cut)
    with BuildSketch(Plane(origin=(0, 5.6, 0), x_dir=(1, 0, 0), z_dir=(0, 1, 0))):
        with Locations((6.55, -8.5)):
            Rectangle(SKETCH8_W, SKETCH8_H)
    extrude(amount=-CUT_EXTRUDE3_DEPTH, mode=Mode.SUBTRACT)

    # Chamfer5
    # the kernel refuses this chamfer: 3 mm, written as the material it takes off along each edge
    with BuildSketch(Plane(origin=(6.229157809, 5.5, 6), x_dir=(0, -0.9850292351397439, -0.17238737169529297), z_dir=(-1, 0, 0))) as chamfer5_piece_1_section:
        with BuildLine():
            Line((3.691663124, 0), (-1.253737533, 3.472249821))
            Line((-1.253737533, 3.472249821), (-1.697000689, 3.394675503))
            ThreePointArc((-1.697000689, 3.394675503), (-0.756697539, 1.713403919), (-0.443263156, -0.077574317))
            Line((-0.443263156, -0.077574317), (0.077574317, -0.443263156))
            ThreePointArc((0.077574317, -0.443263156), (1.868552553, -0.129828772), (3.769237441, -0.443263156))
            Line((3.769237441, -0.443263156), (3.691663124, 0))
        make_face()
    chamfer5_piece_1 = extrude(amount=39.229157809, mode=Mode.PRIVATE)
    chamfer5_piece_1 = split(chamfer5_piece_1, bisect_by=Plane(origin=(-4.039459416, 4.460540584, 7.280331392), z_dir=(-0.7071067811865476, 0.7071067811865476, 0)), keep=Keep.TOP, mode=Mode.PRIVATE)
    chamfer5_piece_1 = split(chamfer5_piece_1, bisect_by=Plane(origin=(-6, 5.114054112, 7.280331392), z_dir=(1, 0, 0)), keep=Keep.TOP, mode=Mode.PRIVATE)
    add(chamfer5_piece_1, mode=Mode.SUBTRACT)
    with BuildSketch(Plane(origin=(6.229157809, 5.5, 6), x_dir=(0, -0.9850292351397439, -0.17238737169529297), z_dir=(-1, 0, 0))) as chamfer5_piece_2_section:
        with BuildLine():
            Line((3.691663124, 0), (-1.253737533, 3.472249821))
            Line((-1.253737533, 3.472249821), (-1.697000689, 3.394675503))
            ThreePointArc((-1.697000689, 3.394675503), (-0.756697539, 1.713403919), (-0.443263156, -0.077574317))
            Line((-0.443263156, -0.077574317), (0.077574317, -0.443263156))
            ThreePointArc((0.077574317, -0.443263156), (1.868552553, -0.129828772), (3.769237441, -0.443263156))
            Line((3.769237441, -0.443263156), (3.691663124, 0))
        make_face()
    chamfer5_piece_2 = extrude(amount=39.229157809, mode=Mode.PRIVATE)
    chamfer5_piece_2 = split(chamfer5_piece_2, bisect_by=Plane(origin=(-6.302738925, 2.197261075, 5.315019574), z_dir=(0.7071067811865476, -0.7071067811865476, 0)), keep=Keep.TOP, mode=Mode.PRIVATE)
    chamfer5_piece_2 = split(chamfer5_piece_2, bisect_by=Plane(origin=(-6, 2.0963481, 5.315019574), z_dir=(-1, 0, 0)), keep=Keep.TOP, mode=Mode.PRIVATE)
    add(chamfer5_piece_2, mode=Mode.SUBTRACT)
    with BuildSketch(Plane(origin=(6.229157809, 5.5, 6), x_dir=(0, -0.9850292351397439, -0.17238737169529297), z_dir=(-1, 0, 0))) as chamfer5_piece_3_section:
        with BuildLine():
            Line((3.691663124, 0), (-1.253737533, 3.472249821))
            Line((-1.253737533, 3.472249821), (-1.697000689, 3.394675503))
            ThreePointArc((-1.697000689, 3.394675503), (-0.756697539, 1.713403919), (-0.443263156, -0.077574317))
            Line((-0.443263156, -0.077574317), (0.077574317, -0.443263156))
            ThreePointArc((0.077574317, -0.443263156), (1.868552553, -0.129828772), (3.769237441, -0.443263156))
            Line((3.769237441, -0.443263156), (3.691663124, 0))
        make_face()
    chamfer5_piece_3 = extrude(amount=39.229157809, mode=Mode.PRIVATE)
    chamfer5_piece_3 = split(chamfer5_piece_3, bisect_by=Plane(origin=(-11.711520685, -3.211520685, 6.918404597), z_dir=(-0.7071067811865476, 0.7071067811865476, 0)), keep=Keep.TOP, mode=Mode.PRIVATE)
    chamfer5_piece_3 = split(chamfer5_piece_3, bisect_by=Plane(origin=(-6, 4.583653926, 6.918404597), z_dir=(-1, 0, 0)), keep=Keep.TOP, mode=Mode.PRIVATE)
    add(chamfer5_piece_3, mode=Mode.SUBTRACT)
    with BuildSketch(Plane(origin=(6.229157809, 5.5, 6), x_dir=(0, -0.9850292351397439, -0.17238737169529297), z_dir=(-1, 0, 0))) as chamfer5_piece_4_section:
        with BuildLine():
            Line((3.691663124, 0), (-1.253737533, 3.472249821))
            Line((-1.253737533, 3.472249821), (-1.697000689, 3.394675503))
            ThreePointArc((-1.697000689, 3.394675503), (-0.756697539, 1.713403919), (-0.443263156, -0.077574317))
            Line((-0.443263156, -0.077574317), (0.077574317, -0.443263156))
            ThreePointArc((0.077574317, -0.443263156), (1.868552553, -0.129828772), (3.769237441, -0.443263156))
            Line((3.769237441, -0.443263156), (3.691663124, 0))
        make_face()
    chamfer5_piece_4 = extrude(amount=48.458315618, mode=Mode.PRIVATE)
    chamfer5_piece_4 = split(chamfer5_piece_4, bisect_by=Plane(origin=(-33, 4.582402261, 6.917597739), z_dir=(-1, 0, 0)), keep=Keep.TOP, mode=Mode.PRIVATE)
    add(chamfer5_piece_4, mode=Mode.SUBTRACT)


solid = part_1.part
